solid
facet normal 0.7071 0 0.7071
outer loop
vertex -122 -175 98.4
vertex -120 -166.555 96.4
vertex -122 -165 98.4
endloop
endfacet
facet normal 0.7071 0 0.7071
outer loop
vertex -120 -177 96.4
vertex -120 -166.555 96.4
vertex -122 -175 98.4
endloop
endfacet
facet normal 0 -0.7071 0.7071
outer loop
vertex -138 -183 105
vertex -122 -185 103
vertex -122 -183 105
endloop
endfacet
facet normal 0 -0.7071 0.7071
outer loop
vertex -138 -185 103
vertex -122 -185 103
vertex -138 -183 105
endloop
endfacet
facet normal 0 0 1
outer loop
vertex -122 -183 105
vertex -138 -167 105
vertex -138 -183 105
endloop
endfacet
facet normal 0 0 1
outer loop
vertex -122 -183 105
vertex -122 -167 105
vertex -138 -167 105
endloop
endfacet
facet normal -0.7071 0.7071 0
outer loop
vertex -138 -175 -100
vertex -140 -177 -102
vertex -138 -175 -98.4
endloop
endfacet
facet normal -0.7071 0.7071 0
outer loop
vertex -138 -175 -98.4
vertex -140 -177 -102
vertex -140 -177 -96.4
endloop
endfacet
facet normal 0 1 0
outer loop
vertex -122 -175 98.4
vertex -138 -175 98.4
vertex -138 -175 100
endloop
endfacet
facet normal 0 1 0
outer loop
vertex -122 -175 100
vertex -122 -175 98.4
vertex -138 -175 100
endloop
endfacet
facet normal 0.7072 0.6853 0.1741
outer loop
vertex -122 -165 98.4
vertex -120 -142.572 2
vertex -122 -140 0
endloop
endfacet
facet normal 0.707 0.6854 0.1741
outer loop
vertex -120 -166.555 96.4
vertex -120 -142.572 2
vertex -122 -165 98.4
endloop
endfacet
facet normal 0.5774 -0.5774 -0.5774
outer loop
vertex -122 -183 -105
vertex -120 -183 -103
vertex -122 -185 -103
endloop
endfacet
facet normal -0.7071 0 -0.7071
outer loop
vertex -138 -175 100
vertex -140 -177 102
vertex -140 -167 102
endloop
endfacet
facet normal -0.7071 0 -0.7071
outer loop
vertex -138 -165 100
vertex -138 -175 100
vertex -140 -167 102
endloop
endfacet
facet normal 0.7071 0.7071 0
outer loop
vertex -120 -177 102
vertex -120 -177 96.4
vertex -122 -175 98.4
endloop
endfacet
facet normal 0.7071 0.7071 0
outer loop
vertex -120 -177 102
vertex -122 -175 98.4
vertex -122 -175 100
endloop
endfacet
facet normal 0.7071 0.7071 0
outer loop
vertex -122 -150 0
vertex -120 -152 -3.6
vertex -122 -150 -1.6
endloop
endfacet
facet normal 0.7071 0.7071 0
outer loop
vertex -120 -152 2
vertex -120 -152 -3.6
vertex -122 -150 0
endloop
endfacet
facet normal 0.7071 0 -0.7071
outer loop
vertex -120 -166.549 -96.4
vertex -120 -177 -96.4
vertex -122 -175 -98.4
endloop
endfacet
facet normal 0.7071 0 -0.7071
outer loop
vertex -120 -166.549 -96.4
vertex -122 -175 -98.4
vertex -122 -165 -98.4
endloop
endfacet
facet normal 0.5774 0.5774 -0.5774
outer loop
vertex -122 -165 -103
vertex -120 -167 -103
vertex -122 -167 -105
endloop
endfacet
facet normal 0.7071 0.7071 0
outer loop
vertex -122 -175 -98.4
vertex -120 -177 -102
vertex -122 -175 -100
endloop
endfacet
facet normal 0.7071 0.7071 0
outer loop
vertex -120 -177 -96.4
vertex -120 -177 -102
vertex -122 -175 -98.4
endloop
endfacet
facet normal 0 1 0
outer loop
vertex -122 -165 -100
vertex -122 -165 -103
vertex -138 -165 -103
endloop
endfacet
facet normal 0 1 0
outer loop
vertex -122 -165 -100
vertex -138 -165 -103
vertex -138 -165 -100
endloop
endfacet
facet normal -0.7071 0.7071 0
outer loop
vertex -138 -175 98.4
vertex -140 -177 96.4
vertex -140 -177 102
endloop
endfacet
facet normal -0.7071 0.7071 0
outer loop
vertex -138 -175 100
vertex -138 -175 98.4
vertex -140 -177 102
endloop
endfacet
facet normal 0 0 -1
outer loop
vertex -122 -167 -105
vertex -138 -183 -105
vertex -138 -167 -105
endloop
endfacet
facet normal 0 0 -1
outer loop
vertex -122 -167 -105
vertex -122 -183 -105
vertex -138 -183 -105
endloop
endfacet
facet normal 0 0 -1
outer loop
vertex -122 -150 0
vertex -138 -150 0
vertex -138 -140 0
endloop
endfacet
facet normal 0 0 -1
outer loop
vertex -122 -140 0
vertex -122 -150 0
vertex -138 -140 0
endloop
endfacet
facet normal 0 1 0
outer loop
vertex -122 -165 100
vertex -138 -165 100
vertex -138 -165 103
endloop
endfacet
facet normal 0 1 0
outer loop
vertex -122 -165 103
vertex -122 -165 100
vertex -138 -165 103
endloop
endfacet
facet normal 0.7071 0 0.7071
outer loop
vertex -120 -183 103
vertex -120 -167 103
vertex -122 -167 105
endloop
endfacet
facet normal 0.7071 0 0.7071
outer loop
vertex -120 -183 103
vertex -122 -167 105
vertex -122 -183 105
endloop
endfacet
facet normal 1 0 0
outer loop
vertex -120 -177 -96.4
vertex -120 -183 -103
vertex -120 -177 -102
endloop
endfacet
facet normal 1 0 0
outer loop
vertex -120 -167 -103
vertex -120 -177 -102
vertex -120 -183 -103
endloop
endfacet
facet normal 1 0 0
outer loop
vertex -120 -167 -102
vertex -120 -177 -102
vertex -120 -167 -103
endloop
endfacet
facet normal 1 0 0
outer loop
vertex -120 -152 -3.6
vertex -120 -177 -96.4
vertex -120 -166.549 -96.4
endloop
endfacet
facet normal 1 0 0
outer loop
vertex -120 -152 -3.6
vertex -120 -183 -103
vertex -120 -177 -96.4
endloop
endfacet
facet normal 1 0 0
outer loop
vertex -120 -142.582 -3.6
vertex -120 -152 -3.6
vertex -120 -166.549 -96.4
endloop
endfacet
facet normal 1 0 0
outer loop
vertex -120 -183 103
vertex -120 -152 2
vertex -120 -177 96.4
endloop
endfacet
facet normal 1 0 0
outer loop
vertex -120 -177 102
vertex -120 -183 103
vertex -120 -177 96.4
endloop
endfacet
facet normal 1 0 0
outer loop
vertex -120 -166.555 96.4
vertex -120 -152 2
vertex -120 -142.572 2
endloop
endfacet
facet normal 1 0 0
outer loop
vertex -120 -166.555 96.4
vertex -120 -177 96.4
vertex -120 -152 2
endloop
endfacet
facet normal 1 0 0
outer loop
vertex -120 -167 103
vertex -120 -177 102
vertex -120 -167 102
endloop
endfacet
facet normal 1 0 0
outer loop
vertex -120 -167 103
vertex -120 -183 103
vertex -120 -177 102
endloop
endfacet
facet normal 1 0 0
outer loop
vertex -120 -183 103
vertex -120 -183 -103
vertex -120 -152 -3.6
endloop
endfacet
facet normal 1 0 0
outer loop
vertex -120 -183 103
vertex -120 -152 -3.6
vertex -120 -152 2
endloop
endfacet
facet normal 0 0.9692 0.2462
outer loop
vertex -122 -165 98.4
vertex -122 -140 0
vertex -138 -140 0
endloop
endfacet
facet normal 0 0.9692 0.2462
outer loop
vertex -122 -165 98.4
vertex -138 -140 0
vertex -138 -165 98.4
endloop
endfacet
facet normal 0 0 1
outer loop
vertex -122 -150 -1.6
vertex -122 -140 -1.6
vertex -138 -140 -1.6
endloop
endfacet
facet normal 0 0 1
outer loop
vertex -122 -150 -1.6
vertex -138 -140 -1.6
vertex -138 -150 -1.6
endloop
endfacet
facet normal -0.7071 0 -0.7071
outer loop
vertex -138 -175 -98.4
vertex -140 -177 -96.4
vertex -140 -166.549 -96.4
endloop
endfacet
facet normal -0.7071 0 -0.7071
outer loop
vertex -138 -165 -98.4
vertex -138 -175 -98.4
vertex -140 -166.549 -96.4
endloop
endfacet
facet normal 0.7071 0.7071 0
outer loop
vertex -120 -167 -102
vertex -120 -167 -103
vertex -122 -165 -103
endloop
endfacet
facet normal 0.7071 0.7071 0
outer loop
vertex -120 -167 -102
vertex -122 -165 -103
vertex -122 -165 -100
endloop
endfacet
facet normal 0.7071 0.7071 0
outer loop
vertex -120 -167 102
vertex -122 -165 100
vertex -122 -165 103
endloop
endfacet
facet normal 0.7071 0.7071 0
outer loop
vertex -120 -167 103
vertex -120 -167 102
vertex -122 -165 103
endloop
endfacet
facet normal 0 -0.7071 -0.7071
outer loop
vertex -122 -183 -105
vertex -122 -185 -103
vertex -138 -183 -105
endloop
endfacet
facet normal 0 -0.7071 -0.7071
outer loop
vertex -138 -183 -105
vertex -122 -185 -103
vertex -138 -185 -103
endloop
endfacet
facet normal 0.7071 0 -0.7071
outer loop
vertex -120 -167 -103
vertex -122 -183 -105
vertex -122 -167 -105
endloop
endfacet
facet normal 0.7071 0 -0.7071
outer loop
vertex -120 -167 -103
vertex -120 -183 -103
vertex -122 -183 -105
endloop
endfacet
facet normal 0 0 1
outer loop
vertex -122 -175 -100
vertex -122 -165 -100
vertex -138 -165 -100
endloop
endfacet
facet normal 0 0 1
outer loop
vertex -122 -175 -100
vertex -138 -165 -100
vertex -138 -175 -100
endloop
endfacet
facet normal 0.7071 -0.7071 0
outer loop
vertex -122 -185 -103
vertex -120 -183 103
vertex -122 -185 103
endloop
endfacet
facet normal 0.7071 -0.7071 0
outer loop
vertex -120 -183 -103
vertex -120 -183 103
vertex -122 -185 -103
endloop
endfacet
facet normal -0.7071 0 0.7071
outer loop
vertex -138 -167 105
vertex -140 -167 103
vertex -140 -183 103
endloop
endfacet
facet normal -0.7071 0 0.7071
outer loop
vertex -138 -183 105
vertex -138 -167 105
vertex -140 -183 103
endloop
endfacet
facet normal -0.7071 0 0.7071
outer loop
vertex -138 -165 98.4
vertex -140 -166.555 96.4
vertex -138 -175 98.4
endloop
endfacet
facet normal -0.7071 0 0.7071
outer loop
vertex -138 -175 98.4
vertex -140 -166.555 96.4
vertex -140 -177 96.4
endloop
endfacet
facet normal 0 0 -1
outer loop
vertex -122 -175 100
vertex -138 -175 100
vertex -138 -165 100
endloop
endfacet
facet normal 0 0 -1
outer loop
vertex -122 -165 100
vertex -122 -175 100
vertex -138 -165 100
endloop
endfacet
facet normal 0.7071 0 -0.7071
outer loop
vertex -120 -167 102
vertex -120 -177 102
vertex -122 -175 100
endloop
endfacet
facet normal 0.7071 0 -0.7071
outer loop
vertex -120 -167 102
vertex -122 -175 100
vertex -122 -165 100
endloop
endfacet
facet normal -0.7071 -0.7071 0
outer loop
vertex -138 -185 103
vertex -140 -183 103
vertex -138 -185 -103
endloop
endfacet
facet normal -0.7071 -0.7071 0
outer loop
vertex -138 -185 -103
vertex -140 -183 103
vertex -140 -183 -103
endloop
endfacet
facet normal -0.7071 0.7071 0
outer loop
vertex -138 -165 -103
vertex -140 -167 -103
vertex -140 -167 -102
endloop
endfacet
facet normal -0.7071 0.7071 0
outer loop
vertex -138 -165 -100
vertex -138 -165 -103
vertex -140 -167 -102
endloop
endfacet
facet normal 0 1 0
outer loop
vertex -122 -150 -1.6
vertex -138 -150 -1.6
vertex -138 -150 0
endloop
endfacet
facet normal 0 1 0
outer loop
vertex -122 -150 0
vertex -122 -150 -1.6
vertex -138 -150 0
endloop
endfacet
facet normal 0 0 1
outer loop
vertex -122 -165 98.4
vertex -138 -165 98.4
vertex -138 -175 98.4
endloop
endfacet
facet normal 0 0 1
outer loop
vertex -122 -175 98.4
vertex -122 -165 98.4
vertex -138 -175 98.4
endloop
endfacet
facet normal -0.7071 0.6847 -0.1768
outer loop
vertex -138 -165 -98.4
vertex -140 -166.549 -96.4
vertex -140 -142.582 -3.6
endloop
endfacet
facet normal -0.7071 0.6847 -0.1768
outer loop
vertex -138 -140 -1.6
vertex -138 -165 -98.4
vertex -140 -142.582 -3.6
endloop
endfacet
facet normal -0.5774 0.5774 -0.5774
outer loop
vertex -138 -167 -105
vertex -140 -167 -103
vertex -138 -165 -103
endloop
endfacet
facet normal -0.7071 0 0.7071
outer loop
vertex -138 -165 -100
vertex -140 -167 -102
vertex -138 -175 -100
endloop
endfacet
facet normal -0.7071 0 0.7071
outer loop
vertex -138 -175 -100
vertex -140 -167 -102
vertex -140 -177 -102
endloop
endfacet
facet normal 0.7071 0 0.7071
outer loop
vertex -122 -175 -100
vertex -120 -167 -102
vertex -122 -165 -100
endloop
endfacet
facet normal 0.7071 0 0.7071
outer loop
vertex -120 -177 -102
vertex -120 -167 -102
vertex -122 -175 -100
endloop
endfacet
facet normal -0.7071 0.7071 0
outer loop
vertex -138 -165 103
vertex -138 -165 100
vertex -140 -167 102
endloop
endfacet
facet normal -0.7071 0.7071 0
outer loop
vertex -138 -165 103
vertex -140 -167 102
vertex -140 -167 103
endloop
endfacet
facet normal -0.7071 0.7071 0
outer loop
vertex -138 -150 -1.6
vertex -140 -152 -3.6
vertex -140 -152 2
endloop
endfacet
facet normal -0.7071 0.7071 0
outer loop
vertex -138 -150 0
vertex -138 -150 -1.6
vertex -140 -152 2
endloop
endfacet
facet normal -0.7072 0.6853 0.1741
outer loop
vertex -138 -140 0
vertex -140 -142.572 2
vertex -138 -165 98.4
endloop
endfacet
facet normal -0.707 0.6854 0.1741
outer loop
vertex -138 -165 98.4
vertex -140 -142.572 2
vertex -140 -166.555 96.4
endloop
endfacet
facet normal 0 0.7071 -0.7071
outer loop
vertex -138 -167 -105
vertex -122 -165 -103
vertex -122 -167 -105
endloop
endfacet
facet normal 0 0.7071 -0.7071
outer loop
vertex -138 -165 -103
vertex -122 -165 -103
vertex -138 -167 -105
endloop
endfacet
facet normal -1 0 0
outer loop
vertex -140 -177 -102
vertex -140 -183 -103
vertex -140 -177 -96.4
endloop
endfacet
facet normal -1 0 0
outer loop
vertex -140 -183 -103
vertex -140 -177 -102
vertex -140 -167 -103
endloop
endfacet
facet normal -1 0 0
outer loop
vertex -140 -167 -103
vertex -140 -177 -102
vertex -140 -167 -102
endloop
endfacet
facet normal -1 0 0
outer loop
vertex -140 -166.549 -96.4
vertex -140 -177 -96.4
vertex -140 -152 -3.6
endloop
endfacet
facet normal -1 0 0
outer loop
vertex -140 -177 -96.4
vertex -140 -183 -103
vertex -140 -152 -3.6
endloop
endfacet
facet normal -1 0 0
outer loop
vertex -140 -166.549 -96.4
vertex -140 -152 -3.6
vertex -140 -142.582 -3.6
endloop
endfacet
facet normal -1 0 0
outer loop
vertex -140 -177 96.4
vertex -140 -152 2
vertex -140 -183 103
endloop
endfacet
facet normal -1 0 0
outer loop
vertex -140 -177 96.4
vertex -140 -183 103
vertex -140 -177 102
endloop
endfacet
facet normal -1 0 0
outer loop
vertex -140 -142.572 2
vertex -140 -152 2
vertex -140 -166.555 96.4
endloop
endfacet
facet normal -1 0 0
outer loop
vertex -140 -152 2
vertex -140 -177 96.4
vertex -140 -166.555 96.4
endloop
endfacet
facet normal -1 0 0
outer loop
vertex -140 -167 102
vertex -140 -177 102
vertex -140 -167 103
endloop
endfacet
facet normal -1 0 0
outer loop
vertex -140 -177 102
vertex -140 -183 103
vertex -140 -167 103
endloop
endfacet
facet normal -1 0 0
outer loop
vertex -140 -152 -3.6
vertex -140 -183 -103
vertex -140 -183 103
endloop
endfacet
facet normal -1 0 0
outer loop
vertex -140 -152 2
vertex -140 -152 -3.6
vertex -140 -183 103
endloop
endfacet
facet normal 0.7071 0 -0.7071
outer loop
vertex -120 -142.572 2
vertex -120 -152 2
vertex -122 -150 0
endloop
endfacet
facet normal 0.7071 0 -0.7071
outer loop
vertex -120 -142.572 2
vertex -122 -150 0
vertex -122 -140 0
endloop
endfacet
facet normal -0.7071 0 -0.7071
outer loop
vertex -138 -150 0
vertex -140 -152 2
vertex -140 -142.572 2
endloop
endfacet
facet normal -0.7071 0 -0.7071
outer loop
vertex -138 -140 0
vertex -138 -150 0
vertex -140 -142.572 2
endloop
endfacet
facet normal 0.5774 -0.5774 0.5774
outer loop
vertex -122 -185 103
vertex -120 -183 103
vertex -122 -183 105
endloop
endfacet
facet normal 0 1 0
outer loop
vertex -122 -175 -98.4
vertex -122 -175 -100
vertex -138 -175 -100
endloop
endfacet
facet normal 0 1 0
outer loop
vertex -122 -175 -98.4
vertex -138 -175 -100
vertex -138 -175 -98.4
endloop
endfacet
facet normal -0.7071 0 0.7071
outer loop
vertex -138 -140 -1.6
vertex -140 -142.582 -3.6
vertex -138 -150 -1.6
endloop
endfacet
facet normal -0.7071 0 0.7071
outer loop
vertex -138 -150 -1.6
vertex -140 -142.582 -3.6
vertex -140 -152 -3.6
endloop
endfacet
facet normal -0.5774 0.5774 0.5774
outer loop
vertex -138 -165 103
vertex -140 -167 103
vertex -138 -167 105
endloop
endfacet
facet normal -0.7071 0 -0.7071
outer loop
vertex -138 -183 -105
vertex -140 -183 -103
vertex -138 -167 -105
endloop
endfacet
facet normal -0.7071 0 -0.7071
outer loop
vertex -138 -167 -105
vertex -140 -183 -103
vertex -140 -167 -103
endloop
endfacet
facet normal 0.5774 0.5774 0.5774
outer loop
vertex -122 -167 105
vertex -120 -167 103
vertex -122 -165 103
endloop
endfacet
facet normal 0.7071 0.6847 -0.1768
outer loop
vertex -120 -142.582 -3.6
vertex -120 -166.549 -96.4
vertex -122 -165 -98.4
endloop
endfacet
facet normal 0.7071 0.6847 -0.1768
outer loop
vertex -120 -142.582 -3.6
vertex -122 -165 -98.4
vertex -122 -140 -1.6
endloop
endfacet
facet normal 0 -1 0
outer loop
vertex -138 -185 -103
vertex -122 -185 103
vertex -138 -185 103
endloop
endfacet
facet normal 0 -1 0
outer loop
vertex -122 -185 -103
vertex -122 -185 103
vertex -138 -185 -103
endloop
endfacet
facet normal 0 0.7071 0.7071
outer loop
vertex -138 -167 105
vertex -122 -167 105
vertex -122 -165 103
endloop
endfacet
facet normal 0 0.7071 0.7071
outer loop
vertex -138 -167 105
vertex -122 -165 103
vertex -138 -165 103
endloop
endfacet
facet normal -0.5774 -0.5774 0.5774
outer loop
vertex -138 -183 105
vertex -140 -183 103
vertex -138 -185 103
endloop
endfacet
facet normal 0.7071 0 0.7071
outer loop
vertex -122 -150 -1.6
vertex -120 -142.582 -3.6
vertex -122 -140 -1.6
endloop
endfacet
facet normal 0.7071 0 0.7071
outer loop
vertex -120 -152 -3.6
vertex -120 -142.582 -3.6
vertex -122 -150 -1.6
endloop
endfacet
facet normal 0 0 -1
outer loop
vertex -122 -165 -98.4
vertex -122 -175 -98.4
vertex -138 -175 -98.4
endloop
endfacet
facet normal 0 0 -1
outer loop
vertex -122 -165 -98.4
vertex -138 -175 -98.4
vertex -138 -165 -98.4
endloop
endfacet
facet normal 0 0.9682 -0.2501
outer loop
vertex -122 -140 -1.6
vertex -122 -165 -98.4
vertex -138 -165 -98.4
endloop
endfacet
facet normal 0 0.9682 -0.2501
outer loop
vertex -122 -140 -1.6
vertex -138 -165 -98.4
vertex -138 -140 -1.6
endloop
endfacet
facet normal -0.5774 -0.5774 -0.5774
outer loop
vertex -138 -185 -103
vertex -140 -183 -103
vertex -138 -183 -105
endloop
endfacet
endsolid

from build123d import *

# Parameters (mm, degrees)
PAD005_DEPTH            = 20
CHAMFER_SIZE            = 2
BODY003_ROLL_ANGLE      = 90
BODY003_PLACEMENT_ANGLE = 90


with BuildPart() as sideholder1:
    # Sketch006 → Pad005 (new body)
    with BuildSketch(Plane.XY):
        Polygon((0, -105), (20, -105), (20, -100), (10, -100), (10, -98.4), (20, -98.4), (45, -1.6), (35, -1.6), (35, 0), (45, 0), (20, 98.4), (10, 98.4), (10, 100), (20, 100), (20, 105), (0, 105), align=None)
    extrude(amount=PAD005_DEPTH)

    # Chamfer
    chamfer_edges = [sideholder1.edges().sort_by_distance(p)[0] for p in [
        (10, -105, 20),
        (20, -102.5, 20),
        (15, -100, 20),
        (10, -99.2, 20),
        (15, -98.4, 20),
        (32.5, -50, 20),
        (40, -1.6, 20),
        (35, -0.8, 20),
        (40, 0, 20),
        (32.5, 49.2, 20),
        (15, 98.4, 20),
        (10, 99.2, 20),
        (15, 100, 20),
        (20, 102.5, 20),
        (10, 105, 20),
        (0, 0, 20),
        (10, -105, 0),
        (20, -102.5, 0),
        (15, -100, 0),
        (10, -99.2, 0),
        (15, -98.4, 0),
        (32.5, -50, 0),
        (40, -1.6, 0),
        (35, -0.8, 0),
        (40, 0, 0),
        (32.5, 49.2, 0),
        (15, 98.4, 0),
        (10, 99.2, 0),
        (15, 100, 0),
        (20, 102.5, 0),
        (10, 105, 0),
        (0, 0, 0),
        (0, 105, 10),
        (0, -105, 10),
        (20, 105, 10),
        (20, -105, 10),
    ]]
    chamfer(chamfer_edges, length=CHAMFER_SIZE)


with BuildPart() as sideholder1_1:
    # Body003 roll: moved
    add(sideholder1.part.rotate(Axis((0, 0, 0), (1, 0, 0)), BODY003_ROLL_ANGLE))


with BuildPart() as sideholder1_2:
    # Body003 placement: moved
    add(sideholder1_1.part.moved(Location((120, -185, 0))).rotate(Axis((120, -185, 0), (0, 0, 1)), BODY003_PLACEMENT_ANGLE))


with BuildPart() as sideholder2_mirror:
    # mirror: instance of SideHolder1
    add(sideholder1_2.part.mirror(Plane(origin=(0, 0, 0), x_dir=(0, -1, 0), z_dir=(1, 0, 0))))


solid = sideholder2_mirror.part
